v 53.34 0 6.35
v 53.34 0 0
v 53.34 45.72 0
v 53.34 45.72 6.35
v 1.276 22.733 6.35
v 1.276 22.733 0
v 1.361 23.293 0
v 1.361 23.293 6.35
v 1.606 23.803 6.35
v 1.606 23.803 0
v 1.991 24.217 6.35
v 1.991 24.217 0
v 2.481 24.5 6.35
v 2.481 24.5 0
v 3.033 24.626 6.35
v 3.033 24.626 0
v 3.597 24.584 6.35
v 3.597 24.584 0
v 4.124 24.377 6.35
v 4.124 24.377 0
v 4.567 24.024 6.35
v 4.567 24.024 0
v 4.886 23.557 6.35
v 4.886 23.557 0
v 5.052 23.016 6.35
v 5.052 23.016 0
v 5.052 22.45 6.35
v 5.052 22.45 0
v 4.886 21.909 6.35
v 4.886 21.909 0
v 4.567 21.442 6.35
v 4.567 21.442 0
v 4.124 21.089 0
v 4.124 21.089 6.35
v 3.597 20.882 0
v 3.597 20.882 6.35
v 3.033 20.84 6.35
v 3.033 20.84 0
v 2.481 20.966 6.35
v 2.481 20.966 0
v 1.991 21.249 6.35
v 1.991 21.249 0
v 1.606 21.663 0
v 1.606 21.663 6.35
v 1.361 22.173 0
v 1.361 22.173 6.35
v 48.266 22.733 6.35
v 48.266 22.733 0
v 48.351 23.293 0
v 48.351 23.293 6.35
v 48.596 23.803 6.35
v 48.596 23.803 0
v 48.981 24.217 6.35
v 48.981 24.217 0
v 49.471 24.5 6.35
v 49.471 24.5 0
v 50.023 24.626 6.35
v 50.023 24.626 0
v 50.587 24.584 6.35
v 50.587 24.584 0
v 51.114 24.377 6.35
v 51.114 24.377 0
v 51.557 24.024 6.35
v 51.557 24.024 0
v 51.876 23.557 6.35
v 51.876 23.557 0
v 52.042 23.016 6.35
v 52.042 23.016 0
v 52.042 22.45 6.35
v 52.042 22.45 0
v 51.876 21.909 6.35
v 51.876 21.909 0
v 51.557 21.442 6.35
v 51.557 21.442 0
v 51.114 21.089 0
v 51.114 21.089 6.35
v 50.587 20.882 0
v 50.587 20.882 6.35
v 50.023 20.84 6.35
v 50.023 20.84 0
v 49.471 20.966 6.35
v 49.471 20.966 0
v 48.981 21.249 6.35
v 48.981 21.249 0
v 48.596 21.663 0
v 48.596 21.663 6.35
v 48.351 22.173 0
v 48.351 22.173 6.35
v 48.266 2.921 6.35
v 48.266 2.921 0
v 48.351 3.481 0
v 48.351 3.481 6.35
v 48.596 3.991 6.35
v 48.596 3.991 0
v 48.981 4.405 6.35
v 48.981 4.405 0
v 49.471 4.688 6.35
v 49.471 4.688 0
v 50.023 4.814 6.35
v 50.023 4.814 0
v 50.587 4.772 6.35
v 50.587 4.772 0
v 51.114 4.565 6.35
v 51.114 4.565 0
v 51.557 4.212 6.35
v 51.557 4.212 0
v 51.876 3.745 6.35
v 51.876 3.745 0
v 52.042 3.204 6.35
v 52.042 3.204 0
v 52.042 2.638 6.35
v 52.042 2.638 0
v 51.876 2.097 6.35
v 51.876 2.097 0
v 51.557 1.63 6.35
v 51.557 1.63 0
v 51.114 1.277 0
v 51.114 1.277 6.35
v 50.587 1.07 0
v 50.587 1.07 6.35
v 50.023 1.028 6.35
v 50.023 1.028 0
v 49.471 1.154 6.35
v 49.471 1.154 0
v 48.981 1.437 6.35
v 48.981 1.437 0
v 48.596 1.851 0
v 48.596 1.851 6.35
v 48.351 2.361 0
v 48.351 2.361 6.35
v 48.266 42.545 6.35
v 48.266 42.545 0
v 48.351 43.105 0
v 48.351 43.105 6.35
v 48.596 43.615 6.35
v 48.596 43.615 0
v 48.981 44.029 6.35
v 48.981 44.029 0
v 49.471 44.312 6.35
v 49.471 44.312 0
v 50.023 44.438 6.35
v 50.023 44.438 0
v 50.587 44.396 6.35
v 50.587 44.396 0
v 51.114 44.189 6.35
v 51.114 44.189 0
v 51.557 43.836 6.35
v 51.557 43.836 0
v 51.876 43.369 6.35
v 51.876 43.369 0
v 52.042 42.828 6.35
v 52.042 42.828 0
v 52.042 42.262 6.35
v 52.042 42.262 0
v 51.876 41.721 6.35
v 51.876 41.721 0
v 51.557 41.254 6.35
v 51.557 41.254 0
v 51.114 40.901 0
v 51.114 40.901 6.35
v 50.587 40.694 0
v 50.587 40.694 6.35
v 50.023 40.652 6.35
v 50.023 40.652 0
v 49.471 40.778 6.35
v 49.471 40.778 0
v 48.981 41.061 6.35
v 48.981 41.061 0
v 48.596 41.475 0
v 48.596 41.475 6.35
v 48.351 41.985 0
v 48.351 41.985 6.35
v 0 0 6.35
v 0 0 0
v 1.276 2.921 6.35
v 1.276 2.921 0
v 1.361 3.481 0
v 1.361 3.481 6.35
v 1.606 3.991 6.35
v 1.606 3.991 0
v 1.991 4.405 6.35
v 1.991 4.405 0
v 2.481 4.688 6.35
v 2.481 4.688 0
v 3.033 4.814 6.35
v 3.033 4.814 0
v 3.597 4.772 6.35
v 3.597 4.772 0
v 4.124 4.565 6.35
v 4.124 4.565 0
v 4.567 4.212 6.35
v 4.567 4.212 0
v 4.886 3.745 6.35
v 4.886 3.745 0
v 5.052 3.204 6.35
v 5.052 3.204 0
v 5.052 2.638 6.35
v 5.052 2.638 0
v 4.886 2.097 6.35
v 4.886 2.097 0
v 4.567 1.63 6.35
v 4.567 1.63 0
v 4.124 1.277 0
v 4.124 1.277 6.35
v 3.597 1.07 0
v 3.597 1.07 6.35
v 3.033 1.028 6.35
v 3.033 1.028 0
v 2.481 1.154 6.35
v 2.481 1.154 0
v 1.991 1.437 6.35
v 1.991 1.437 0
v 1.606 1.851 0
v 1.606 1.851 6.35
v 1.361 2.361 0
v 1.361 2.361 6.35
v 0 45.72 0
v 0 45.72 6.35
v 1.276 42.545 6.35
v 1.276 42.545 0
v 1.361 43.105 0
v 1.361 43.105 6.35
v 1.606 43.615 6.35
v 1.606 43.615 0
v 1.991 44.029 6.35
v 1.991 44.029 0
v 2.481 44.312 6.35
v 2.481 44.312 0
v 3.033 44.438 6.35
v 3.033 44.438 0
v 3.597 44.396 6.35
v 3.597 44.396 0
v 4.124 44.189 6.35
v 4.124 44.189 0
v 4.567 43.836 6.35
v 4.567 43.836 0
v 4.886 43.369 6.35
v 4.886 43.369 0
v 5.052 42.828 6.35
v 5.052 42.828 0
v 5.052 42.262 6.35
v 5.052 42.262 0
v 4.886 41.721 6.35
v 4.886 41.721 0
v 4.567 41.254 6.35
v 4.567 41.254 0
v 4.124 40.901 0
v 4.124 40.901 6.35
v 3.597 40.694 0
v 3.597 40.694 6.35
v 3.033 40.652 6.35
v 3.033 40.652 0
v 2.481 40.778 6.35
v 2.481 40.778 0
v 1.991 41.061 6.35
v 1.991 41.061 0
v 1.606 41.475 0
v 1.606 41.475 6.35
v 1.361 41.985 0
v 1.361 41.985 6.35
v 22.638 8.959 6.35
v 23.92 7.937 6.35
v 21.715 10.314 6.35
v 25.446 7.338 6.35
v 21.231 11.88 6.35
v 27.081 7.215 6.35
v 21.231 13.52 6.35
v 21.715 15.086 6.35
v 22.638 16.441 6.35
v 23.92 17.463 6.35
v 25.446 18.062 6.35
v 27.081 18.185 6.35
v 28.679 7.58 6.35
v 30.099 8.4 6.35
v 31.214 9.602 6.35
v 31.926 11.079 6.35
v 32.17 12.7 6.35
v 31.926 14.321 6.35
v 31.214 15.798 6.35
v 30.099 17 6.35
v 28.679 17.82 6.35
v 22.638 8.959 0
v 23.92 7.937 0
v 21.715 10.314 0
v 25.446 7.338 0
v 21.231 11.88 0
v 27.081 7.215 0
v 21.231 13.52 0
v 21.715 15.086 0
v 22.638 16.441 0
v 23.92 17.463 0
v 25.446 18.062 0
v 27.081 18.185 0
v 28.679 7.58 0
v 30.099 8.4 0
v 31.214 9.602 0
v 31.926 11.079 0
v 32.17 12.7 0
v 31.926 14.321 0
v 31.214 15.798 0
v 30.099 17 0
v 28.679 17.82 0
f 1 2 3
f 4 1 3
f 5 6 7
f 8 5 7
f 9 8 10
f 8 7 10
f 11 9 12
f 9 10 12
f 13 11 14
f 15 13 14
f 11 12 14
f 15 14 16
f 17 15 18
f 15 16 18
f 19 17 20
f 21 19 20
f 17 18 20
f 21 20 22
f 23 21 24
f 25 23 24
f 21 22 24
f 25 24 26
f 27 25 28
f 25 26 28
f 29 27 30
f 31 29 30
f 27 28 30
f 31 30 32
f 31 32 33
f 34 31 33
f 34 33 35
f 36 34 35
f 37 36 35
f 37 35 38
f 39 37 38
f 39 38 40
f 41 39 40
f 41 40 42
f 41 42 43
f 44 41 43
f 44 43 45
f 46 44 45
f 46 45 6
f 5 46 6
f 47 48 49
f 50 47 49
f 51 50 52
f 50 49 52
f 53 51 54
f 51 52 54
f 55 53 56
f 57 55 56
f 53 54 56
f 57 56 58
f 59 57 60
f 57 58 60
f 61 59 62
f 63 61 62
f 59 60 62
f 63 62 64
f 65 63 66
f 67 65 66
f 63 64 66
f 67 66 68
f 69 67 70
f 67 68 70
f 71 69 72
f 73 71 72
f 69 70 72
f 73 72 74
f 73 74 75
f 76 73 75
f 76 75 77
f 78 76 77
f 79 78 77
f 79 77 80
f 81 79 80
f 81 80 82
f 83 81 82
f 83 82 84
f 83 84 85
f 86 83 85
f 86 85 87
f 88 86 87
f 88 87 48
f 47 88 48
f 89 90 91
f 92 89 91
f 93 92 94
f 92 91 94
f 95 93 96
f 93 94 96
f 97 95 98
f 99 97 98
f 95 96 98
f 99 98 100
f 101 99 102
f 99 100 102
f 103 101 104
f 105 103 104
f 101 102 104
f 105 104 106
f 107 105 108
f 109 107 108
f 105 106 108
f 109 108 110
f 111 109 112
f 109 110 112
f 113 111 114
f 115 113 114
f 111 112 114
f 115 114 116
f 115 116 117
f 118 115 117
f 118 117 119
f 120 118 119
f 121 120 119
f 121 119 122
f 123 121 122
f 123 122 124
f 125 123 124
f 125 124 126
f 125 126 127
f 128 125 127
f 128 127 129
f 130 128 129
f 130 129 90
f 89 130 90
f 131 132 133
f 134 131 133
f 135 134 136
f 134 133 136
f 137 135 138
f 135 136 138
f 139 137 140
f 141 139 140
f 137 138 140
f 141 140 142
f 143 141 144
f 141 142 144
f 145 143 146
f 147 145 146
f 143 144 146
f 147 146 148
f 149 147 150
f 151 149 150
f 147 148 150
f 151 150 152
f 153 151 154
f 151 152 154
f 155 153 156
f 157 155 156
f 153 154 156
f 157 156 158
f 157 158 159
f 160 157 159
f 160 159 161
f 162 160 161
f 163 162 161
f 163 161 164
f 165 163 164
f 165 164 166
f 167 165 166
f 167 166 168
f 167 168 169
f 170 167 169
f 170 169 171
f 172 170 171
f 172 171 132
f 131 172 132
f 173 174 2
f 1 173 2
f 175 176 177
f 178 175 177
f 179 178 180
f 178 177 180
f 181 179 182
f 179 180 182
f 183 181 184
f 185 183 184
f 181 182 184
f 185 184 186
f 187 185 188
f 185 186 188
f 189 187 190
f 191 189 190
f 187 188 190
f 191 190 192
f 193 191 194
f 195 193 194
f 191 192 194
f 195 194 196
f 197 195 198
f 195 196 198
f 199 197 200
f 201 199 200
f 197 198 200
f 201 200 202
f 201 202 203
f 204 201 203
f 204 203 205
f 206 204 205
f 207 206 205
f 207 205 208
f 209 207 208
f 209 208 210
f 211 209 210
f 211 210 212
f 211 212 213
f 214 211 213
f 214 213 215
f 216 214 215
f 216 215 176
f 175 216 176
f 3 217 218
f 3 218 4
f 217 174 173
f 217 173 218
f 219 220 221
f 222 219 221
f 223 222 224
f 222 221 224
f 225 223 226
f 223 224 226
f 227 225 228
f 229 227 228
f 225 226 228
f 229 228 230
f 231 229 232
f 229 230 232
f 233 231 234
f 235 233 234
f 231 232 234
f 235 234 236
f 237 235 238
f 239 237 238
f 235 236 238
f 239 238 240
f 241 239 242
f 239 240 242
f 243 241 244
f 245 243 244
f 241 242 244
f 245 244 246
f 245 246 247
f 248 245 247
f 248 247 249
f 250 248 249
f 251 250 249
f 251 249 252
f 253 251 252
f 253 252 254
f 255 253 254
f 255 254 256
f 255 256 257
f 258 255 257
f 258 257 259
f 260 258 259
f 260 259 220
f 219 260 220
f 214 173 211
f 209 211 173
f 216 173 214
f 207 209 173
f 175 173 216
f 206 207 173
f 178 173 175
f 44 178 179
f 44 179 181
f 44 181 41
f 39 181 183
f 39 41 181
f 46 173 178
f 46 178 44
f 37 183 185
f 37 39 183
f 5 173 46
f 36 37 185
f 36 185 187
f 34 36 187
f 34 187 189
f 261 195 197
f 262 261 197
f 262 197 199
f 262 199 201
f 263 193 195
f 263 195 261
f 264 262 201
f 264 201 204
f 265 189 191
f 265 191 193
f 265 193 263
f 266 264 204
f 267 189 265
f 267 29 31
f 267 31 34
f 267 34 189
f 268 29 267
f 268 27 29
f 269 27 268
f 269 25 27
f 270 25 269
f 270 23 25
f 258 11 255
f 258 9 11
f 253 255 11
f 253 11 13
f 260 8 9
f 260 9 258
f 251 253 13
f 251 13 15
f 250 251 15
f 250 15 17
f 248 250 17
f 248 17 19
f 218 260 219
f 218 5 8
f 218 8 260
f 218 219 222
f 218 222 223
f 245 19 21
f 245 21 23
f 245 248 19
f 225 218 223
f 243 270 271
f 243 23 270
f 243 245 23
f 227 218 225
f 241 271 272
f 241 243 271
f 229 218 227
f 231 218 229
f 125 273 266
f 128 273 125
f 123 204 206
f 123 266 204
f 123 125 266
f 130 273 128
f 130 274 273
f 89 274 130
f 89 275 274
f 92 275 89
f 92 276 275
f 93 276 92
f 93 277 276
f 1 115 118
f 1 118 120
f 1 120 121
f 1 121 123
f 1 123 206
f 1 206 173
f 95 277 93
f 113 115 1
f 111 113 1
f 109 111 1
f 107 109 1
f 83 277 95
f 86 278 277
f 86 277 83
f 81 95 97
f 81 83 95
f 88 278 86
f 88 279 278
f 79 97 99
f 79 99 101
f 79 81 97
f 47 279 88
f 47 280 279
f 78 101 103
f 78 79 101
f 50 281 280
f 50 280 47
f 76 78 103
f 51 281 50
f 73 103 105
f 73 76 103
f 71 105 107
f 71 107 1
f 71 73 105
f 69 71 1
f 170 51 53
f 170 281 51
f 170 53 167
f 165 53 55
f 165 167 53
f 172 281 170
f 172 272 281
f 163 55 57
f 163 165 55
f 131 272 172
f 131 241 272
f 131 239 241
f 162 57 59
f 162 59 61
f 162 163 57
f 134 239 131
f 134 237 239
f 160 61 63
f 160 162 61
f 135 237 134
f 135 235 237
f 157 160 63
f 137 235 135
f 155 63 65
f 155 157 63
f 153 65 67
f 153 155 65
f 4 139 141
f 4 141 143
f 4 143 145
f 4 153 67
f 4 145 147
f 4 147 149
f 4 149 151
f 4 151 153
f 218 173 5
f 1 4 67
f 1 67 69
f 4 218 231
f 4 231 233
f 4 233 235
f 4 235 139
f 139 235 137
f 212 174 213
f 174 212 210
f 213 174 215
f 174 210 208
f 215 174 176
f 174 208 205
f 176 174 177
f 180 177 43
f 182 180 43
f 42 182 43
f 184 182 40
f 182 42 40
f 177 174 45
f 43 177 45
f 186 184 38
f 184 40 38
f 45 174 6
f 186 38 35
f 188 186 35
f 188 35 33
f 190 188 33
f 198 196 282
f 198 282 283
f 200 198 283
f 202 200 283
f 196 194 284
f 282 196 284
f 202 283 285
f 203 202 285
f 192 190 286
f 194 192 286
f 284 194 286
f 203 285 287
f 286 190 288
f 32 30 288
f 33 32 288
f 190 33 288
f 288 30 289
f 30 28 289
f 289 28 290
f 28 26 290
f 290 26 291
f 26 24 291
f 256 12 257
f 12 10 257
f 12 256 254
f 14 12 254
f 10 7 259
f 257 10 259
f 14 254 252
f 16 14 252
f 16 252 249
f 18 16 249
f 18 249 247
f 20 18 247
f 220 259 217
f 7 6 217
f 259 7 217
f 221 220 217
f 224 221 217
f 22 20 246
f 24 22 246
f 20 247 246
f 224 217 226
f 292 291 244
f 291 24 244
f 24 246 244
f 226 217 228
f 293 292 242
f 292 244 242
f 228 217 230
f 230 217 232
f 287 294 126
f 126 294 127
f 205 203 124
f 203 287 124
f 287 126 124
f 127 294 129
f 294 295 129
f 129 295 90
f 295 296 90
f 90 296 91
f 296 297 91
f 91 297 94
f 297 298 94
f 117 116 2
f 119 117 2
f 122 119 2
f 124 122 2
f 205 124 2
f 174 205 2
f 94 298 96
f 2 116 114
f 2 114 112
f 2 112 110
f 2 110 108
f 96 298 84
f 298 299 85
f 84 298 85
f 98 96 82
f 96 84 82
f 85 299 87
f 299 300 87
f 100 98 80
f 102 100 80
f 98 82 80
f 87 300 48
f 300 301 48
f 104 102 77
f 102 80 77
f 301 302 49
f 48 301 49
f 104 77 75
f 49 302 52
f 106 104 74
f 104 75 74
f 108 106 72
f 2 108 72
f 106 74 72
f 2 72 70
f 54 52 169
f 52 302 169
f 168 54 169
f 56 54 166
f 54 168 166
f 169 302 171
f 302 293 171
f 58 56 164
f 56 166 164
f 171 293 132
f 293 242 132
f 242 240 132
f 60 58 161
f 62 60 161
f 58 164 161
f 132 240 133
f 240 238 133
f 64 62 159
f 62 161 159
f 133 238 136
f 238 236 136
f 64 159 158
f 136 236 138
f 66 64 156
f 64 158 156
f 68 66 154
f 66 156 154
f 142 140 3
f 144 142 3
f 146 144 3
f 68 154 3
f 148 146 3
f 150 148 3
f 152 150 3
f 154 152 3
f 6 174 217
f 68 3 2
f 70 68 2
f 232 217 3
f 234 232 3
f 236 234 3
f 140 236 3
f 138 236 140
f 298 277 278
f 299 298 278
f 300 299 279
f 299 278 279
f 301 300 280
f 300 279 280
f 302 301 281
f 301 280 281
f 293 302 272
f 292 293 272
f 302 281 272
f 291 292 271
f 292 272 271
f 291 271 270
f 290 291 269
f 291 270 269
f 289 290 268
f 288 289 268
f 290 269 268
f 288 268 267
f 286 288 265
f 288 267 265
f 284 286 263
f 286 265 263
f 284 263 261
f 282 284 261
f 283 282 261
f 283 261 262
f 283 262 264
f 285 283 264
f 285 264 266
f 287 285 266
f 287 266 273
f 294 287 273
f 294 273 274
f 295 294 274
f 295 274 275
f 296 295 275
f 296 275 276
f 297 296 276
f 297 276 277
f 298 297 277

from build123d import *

# Parameters (mm, degrees)
SKETCH1_W                 = 53.34
SKETCH1_H                 = 45.72
BOSS_EXTRUDE1_DEPTH       = 6.35
SKETCH2_R                 = 5.5
CUT_EXTRUDE1_DEPTH        = 1
CUT_EXTRUDE1_DEPTH_BACK   = 7.35
F_6_CLEARANCE_HOLE1_D     = 3.7973
F_6_CLEARANCE_HOLE1_DEPTH = 6.35


with BuildPart() as part:
    # Sketch1 → Boss-Extrude1 (new body)
    with BuildSketch(Plane.XY):
        with Locations((26.67, 22.86)):
            Rectangle(SKETCH1_W, SKETCH1_H)
    extrude(amount=BOSS_EXTRUDE1_DEPTH)

    # Sketch2 → Cut-Extrude1 (cut, two sides)
    with BuildSketch(Plane.XY.offset(6.35)) as cut_extrude1_sk:
        with Locations((26.67, 12.7)):
            Circle(SKETCH2_R)
    extrude(amount=CUT_EXTRUDE1_DEPTH, mode=Mode.SUBTRACT)
    extrude(cut_extrude1_sk.sketch, amount=-CUT_EXTRUDE1_DEPTH_BACK, mode=Mode.SUBTRACT)

    # #6 Clearance Hole1
    with Locations(Plane.XY.offset(6.35)):
        with Locations((3.175, 42.545), (50.165, 42.545), (50.165, 22.733), (50.165, 2.921), (3.175, 22.733), (3.175, 2.921)):
            Hole(F_6_CLEARANCE_HOLE1_D / 2, depth=F_6_CLEARANCE_HOLE1_DEPTH)


solid = part.part
